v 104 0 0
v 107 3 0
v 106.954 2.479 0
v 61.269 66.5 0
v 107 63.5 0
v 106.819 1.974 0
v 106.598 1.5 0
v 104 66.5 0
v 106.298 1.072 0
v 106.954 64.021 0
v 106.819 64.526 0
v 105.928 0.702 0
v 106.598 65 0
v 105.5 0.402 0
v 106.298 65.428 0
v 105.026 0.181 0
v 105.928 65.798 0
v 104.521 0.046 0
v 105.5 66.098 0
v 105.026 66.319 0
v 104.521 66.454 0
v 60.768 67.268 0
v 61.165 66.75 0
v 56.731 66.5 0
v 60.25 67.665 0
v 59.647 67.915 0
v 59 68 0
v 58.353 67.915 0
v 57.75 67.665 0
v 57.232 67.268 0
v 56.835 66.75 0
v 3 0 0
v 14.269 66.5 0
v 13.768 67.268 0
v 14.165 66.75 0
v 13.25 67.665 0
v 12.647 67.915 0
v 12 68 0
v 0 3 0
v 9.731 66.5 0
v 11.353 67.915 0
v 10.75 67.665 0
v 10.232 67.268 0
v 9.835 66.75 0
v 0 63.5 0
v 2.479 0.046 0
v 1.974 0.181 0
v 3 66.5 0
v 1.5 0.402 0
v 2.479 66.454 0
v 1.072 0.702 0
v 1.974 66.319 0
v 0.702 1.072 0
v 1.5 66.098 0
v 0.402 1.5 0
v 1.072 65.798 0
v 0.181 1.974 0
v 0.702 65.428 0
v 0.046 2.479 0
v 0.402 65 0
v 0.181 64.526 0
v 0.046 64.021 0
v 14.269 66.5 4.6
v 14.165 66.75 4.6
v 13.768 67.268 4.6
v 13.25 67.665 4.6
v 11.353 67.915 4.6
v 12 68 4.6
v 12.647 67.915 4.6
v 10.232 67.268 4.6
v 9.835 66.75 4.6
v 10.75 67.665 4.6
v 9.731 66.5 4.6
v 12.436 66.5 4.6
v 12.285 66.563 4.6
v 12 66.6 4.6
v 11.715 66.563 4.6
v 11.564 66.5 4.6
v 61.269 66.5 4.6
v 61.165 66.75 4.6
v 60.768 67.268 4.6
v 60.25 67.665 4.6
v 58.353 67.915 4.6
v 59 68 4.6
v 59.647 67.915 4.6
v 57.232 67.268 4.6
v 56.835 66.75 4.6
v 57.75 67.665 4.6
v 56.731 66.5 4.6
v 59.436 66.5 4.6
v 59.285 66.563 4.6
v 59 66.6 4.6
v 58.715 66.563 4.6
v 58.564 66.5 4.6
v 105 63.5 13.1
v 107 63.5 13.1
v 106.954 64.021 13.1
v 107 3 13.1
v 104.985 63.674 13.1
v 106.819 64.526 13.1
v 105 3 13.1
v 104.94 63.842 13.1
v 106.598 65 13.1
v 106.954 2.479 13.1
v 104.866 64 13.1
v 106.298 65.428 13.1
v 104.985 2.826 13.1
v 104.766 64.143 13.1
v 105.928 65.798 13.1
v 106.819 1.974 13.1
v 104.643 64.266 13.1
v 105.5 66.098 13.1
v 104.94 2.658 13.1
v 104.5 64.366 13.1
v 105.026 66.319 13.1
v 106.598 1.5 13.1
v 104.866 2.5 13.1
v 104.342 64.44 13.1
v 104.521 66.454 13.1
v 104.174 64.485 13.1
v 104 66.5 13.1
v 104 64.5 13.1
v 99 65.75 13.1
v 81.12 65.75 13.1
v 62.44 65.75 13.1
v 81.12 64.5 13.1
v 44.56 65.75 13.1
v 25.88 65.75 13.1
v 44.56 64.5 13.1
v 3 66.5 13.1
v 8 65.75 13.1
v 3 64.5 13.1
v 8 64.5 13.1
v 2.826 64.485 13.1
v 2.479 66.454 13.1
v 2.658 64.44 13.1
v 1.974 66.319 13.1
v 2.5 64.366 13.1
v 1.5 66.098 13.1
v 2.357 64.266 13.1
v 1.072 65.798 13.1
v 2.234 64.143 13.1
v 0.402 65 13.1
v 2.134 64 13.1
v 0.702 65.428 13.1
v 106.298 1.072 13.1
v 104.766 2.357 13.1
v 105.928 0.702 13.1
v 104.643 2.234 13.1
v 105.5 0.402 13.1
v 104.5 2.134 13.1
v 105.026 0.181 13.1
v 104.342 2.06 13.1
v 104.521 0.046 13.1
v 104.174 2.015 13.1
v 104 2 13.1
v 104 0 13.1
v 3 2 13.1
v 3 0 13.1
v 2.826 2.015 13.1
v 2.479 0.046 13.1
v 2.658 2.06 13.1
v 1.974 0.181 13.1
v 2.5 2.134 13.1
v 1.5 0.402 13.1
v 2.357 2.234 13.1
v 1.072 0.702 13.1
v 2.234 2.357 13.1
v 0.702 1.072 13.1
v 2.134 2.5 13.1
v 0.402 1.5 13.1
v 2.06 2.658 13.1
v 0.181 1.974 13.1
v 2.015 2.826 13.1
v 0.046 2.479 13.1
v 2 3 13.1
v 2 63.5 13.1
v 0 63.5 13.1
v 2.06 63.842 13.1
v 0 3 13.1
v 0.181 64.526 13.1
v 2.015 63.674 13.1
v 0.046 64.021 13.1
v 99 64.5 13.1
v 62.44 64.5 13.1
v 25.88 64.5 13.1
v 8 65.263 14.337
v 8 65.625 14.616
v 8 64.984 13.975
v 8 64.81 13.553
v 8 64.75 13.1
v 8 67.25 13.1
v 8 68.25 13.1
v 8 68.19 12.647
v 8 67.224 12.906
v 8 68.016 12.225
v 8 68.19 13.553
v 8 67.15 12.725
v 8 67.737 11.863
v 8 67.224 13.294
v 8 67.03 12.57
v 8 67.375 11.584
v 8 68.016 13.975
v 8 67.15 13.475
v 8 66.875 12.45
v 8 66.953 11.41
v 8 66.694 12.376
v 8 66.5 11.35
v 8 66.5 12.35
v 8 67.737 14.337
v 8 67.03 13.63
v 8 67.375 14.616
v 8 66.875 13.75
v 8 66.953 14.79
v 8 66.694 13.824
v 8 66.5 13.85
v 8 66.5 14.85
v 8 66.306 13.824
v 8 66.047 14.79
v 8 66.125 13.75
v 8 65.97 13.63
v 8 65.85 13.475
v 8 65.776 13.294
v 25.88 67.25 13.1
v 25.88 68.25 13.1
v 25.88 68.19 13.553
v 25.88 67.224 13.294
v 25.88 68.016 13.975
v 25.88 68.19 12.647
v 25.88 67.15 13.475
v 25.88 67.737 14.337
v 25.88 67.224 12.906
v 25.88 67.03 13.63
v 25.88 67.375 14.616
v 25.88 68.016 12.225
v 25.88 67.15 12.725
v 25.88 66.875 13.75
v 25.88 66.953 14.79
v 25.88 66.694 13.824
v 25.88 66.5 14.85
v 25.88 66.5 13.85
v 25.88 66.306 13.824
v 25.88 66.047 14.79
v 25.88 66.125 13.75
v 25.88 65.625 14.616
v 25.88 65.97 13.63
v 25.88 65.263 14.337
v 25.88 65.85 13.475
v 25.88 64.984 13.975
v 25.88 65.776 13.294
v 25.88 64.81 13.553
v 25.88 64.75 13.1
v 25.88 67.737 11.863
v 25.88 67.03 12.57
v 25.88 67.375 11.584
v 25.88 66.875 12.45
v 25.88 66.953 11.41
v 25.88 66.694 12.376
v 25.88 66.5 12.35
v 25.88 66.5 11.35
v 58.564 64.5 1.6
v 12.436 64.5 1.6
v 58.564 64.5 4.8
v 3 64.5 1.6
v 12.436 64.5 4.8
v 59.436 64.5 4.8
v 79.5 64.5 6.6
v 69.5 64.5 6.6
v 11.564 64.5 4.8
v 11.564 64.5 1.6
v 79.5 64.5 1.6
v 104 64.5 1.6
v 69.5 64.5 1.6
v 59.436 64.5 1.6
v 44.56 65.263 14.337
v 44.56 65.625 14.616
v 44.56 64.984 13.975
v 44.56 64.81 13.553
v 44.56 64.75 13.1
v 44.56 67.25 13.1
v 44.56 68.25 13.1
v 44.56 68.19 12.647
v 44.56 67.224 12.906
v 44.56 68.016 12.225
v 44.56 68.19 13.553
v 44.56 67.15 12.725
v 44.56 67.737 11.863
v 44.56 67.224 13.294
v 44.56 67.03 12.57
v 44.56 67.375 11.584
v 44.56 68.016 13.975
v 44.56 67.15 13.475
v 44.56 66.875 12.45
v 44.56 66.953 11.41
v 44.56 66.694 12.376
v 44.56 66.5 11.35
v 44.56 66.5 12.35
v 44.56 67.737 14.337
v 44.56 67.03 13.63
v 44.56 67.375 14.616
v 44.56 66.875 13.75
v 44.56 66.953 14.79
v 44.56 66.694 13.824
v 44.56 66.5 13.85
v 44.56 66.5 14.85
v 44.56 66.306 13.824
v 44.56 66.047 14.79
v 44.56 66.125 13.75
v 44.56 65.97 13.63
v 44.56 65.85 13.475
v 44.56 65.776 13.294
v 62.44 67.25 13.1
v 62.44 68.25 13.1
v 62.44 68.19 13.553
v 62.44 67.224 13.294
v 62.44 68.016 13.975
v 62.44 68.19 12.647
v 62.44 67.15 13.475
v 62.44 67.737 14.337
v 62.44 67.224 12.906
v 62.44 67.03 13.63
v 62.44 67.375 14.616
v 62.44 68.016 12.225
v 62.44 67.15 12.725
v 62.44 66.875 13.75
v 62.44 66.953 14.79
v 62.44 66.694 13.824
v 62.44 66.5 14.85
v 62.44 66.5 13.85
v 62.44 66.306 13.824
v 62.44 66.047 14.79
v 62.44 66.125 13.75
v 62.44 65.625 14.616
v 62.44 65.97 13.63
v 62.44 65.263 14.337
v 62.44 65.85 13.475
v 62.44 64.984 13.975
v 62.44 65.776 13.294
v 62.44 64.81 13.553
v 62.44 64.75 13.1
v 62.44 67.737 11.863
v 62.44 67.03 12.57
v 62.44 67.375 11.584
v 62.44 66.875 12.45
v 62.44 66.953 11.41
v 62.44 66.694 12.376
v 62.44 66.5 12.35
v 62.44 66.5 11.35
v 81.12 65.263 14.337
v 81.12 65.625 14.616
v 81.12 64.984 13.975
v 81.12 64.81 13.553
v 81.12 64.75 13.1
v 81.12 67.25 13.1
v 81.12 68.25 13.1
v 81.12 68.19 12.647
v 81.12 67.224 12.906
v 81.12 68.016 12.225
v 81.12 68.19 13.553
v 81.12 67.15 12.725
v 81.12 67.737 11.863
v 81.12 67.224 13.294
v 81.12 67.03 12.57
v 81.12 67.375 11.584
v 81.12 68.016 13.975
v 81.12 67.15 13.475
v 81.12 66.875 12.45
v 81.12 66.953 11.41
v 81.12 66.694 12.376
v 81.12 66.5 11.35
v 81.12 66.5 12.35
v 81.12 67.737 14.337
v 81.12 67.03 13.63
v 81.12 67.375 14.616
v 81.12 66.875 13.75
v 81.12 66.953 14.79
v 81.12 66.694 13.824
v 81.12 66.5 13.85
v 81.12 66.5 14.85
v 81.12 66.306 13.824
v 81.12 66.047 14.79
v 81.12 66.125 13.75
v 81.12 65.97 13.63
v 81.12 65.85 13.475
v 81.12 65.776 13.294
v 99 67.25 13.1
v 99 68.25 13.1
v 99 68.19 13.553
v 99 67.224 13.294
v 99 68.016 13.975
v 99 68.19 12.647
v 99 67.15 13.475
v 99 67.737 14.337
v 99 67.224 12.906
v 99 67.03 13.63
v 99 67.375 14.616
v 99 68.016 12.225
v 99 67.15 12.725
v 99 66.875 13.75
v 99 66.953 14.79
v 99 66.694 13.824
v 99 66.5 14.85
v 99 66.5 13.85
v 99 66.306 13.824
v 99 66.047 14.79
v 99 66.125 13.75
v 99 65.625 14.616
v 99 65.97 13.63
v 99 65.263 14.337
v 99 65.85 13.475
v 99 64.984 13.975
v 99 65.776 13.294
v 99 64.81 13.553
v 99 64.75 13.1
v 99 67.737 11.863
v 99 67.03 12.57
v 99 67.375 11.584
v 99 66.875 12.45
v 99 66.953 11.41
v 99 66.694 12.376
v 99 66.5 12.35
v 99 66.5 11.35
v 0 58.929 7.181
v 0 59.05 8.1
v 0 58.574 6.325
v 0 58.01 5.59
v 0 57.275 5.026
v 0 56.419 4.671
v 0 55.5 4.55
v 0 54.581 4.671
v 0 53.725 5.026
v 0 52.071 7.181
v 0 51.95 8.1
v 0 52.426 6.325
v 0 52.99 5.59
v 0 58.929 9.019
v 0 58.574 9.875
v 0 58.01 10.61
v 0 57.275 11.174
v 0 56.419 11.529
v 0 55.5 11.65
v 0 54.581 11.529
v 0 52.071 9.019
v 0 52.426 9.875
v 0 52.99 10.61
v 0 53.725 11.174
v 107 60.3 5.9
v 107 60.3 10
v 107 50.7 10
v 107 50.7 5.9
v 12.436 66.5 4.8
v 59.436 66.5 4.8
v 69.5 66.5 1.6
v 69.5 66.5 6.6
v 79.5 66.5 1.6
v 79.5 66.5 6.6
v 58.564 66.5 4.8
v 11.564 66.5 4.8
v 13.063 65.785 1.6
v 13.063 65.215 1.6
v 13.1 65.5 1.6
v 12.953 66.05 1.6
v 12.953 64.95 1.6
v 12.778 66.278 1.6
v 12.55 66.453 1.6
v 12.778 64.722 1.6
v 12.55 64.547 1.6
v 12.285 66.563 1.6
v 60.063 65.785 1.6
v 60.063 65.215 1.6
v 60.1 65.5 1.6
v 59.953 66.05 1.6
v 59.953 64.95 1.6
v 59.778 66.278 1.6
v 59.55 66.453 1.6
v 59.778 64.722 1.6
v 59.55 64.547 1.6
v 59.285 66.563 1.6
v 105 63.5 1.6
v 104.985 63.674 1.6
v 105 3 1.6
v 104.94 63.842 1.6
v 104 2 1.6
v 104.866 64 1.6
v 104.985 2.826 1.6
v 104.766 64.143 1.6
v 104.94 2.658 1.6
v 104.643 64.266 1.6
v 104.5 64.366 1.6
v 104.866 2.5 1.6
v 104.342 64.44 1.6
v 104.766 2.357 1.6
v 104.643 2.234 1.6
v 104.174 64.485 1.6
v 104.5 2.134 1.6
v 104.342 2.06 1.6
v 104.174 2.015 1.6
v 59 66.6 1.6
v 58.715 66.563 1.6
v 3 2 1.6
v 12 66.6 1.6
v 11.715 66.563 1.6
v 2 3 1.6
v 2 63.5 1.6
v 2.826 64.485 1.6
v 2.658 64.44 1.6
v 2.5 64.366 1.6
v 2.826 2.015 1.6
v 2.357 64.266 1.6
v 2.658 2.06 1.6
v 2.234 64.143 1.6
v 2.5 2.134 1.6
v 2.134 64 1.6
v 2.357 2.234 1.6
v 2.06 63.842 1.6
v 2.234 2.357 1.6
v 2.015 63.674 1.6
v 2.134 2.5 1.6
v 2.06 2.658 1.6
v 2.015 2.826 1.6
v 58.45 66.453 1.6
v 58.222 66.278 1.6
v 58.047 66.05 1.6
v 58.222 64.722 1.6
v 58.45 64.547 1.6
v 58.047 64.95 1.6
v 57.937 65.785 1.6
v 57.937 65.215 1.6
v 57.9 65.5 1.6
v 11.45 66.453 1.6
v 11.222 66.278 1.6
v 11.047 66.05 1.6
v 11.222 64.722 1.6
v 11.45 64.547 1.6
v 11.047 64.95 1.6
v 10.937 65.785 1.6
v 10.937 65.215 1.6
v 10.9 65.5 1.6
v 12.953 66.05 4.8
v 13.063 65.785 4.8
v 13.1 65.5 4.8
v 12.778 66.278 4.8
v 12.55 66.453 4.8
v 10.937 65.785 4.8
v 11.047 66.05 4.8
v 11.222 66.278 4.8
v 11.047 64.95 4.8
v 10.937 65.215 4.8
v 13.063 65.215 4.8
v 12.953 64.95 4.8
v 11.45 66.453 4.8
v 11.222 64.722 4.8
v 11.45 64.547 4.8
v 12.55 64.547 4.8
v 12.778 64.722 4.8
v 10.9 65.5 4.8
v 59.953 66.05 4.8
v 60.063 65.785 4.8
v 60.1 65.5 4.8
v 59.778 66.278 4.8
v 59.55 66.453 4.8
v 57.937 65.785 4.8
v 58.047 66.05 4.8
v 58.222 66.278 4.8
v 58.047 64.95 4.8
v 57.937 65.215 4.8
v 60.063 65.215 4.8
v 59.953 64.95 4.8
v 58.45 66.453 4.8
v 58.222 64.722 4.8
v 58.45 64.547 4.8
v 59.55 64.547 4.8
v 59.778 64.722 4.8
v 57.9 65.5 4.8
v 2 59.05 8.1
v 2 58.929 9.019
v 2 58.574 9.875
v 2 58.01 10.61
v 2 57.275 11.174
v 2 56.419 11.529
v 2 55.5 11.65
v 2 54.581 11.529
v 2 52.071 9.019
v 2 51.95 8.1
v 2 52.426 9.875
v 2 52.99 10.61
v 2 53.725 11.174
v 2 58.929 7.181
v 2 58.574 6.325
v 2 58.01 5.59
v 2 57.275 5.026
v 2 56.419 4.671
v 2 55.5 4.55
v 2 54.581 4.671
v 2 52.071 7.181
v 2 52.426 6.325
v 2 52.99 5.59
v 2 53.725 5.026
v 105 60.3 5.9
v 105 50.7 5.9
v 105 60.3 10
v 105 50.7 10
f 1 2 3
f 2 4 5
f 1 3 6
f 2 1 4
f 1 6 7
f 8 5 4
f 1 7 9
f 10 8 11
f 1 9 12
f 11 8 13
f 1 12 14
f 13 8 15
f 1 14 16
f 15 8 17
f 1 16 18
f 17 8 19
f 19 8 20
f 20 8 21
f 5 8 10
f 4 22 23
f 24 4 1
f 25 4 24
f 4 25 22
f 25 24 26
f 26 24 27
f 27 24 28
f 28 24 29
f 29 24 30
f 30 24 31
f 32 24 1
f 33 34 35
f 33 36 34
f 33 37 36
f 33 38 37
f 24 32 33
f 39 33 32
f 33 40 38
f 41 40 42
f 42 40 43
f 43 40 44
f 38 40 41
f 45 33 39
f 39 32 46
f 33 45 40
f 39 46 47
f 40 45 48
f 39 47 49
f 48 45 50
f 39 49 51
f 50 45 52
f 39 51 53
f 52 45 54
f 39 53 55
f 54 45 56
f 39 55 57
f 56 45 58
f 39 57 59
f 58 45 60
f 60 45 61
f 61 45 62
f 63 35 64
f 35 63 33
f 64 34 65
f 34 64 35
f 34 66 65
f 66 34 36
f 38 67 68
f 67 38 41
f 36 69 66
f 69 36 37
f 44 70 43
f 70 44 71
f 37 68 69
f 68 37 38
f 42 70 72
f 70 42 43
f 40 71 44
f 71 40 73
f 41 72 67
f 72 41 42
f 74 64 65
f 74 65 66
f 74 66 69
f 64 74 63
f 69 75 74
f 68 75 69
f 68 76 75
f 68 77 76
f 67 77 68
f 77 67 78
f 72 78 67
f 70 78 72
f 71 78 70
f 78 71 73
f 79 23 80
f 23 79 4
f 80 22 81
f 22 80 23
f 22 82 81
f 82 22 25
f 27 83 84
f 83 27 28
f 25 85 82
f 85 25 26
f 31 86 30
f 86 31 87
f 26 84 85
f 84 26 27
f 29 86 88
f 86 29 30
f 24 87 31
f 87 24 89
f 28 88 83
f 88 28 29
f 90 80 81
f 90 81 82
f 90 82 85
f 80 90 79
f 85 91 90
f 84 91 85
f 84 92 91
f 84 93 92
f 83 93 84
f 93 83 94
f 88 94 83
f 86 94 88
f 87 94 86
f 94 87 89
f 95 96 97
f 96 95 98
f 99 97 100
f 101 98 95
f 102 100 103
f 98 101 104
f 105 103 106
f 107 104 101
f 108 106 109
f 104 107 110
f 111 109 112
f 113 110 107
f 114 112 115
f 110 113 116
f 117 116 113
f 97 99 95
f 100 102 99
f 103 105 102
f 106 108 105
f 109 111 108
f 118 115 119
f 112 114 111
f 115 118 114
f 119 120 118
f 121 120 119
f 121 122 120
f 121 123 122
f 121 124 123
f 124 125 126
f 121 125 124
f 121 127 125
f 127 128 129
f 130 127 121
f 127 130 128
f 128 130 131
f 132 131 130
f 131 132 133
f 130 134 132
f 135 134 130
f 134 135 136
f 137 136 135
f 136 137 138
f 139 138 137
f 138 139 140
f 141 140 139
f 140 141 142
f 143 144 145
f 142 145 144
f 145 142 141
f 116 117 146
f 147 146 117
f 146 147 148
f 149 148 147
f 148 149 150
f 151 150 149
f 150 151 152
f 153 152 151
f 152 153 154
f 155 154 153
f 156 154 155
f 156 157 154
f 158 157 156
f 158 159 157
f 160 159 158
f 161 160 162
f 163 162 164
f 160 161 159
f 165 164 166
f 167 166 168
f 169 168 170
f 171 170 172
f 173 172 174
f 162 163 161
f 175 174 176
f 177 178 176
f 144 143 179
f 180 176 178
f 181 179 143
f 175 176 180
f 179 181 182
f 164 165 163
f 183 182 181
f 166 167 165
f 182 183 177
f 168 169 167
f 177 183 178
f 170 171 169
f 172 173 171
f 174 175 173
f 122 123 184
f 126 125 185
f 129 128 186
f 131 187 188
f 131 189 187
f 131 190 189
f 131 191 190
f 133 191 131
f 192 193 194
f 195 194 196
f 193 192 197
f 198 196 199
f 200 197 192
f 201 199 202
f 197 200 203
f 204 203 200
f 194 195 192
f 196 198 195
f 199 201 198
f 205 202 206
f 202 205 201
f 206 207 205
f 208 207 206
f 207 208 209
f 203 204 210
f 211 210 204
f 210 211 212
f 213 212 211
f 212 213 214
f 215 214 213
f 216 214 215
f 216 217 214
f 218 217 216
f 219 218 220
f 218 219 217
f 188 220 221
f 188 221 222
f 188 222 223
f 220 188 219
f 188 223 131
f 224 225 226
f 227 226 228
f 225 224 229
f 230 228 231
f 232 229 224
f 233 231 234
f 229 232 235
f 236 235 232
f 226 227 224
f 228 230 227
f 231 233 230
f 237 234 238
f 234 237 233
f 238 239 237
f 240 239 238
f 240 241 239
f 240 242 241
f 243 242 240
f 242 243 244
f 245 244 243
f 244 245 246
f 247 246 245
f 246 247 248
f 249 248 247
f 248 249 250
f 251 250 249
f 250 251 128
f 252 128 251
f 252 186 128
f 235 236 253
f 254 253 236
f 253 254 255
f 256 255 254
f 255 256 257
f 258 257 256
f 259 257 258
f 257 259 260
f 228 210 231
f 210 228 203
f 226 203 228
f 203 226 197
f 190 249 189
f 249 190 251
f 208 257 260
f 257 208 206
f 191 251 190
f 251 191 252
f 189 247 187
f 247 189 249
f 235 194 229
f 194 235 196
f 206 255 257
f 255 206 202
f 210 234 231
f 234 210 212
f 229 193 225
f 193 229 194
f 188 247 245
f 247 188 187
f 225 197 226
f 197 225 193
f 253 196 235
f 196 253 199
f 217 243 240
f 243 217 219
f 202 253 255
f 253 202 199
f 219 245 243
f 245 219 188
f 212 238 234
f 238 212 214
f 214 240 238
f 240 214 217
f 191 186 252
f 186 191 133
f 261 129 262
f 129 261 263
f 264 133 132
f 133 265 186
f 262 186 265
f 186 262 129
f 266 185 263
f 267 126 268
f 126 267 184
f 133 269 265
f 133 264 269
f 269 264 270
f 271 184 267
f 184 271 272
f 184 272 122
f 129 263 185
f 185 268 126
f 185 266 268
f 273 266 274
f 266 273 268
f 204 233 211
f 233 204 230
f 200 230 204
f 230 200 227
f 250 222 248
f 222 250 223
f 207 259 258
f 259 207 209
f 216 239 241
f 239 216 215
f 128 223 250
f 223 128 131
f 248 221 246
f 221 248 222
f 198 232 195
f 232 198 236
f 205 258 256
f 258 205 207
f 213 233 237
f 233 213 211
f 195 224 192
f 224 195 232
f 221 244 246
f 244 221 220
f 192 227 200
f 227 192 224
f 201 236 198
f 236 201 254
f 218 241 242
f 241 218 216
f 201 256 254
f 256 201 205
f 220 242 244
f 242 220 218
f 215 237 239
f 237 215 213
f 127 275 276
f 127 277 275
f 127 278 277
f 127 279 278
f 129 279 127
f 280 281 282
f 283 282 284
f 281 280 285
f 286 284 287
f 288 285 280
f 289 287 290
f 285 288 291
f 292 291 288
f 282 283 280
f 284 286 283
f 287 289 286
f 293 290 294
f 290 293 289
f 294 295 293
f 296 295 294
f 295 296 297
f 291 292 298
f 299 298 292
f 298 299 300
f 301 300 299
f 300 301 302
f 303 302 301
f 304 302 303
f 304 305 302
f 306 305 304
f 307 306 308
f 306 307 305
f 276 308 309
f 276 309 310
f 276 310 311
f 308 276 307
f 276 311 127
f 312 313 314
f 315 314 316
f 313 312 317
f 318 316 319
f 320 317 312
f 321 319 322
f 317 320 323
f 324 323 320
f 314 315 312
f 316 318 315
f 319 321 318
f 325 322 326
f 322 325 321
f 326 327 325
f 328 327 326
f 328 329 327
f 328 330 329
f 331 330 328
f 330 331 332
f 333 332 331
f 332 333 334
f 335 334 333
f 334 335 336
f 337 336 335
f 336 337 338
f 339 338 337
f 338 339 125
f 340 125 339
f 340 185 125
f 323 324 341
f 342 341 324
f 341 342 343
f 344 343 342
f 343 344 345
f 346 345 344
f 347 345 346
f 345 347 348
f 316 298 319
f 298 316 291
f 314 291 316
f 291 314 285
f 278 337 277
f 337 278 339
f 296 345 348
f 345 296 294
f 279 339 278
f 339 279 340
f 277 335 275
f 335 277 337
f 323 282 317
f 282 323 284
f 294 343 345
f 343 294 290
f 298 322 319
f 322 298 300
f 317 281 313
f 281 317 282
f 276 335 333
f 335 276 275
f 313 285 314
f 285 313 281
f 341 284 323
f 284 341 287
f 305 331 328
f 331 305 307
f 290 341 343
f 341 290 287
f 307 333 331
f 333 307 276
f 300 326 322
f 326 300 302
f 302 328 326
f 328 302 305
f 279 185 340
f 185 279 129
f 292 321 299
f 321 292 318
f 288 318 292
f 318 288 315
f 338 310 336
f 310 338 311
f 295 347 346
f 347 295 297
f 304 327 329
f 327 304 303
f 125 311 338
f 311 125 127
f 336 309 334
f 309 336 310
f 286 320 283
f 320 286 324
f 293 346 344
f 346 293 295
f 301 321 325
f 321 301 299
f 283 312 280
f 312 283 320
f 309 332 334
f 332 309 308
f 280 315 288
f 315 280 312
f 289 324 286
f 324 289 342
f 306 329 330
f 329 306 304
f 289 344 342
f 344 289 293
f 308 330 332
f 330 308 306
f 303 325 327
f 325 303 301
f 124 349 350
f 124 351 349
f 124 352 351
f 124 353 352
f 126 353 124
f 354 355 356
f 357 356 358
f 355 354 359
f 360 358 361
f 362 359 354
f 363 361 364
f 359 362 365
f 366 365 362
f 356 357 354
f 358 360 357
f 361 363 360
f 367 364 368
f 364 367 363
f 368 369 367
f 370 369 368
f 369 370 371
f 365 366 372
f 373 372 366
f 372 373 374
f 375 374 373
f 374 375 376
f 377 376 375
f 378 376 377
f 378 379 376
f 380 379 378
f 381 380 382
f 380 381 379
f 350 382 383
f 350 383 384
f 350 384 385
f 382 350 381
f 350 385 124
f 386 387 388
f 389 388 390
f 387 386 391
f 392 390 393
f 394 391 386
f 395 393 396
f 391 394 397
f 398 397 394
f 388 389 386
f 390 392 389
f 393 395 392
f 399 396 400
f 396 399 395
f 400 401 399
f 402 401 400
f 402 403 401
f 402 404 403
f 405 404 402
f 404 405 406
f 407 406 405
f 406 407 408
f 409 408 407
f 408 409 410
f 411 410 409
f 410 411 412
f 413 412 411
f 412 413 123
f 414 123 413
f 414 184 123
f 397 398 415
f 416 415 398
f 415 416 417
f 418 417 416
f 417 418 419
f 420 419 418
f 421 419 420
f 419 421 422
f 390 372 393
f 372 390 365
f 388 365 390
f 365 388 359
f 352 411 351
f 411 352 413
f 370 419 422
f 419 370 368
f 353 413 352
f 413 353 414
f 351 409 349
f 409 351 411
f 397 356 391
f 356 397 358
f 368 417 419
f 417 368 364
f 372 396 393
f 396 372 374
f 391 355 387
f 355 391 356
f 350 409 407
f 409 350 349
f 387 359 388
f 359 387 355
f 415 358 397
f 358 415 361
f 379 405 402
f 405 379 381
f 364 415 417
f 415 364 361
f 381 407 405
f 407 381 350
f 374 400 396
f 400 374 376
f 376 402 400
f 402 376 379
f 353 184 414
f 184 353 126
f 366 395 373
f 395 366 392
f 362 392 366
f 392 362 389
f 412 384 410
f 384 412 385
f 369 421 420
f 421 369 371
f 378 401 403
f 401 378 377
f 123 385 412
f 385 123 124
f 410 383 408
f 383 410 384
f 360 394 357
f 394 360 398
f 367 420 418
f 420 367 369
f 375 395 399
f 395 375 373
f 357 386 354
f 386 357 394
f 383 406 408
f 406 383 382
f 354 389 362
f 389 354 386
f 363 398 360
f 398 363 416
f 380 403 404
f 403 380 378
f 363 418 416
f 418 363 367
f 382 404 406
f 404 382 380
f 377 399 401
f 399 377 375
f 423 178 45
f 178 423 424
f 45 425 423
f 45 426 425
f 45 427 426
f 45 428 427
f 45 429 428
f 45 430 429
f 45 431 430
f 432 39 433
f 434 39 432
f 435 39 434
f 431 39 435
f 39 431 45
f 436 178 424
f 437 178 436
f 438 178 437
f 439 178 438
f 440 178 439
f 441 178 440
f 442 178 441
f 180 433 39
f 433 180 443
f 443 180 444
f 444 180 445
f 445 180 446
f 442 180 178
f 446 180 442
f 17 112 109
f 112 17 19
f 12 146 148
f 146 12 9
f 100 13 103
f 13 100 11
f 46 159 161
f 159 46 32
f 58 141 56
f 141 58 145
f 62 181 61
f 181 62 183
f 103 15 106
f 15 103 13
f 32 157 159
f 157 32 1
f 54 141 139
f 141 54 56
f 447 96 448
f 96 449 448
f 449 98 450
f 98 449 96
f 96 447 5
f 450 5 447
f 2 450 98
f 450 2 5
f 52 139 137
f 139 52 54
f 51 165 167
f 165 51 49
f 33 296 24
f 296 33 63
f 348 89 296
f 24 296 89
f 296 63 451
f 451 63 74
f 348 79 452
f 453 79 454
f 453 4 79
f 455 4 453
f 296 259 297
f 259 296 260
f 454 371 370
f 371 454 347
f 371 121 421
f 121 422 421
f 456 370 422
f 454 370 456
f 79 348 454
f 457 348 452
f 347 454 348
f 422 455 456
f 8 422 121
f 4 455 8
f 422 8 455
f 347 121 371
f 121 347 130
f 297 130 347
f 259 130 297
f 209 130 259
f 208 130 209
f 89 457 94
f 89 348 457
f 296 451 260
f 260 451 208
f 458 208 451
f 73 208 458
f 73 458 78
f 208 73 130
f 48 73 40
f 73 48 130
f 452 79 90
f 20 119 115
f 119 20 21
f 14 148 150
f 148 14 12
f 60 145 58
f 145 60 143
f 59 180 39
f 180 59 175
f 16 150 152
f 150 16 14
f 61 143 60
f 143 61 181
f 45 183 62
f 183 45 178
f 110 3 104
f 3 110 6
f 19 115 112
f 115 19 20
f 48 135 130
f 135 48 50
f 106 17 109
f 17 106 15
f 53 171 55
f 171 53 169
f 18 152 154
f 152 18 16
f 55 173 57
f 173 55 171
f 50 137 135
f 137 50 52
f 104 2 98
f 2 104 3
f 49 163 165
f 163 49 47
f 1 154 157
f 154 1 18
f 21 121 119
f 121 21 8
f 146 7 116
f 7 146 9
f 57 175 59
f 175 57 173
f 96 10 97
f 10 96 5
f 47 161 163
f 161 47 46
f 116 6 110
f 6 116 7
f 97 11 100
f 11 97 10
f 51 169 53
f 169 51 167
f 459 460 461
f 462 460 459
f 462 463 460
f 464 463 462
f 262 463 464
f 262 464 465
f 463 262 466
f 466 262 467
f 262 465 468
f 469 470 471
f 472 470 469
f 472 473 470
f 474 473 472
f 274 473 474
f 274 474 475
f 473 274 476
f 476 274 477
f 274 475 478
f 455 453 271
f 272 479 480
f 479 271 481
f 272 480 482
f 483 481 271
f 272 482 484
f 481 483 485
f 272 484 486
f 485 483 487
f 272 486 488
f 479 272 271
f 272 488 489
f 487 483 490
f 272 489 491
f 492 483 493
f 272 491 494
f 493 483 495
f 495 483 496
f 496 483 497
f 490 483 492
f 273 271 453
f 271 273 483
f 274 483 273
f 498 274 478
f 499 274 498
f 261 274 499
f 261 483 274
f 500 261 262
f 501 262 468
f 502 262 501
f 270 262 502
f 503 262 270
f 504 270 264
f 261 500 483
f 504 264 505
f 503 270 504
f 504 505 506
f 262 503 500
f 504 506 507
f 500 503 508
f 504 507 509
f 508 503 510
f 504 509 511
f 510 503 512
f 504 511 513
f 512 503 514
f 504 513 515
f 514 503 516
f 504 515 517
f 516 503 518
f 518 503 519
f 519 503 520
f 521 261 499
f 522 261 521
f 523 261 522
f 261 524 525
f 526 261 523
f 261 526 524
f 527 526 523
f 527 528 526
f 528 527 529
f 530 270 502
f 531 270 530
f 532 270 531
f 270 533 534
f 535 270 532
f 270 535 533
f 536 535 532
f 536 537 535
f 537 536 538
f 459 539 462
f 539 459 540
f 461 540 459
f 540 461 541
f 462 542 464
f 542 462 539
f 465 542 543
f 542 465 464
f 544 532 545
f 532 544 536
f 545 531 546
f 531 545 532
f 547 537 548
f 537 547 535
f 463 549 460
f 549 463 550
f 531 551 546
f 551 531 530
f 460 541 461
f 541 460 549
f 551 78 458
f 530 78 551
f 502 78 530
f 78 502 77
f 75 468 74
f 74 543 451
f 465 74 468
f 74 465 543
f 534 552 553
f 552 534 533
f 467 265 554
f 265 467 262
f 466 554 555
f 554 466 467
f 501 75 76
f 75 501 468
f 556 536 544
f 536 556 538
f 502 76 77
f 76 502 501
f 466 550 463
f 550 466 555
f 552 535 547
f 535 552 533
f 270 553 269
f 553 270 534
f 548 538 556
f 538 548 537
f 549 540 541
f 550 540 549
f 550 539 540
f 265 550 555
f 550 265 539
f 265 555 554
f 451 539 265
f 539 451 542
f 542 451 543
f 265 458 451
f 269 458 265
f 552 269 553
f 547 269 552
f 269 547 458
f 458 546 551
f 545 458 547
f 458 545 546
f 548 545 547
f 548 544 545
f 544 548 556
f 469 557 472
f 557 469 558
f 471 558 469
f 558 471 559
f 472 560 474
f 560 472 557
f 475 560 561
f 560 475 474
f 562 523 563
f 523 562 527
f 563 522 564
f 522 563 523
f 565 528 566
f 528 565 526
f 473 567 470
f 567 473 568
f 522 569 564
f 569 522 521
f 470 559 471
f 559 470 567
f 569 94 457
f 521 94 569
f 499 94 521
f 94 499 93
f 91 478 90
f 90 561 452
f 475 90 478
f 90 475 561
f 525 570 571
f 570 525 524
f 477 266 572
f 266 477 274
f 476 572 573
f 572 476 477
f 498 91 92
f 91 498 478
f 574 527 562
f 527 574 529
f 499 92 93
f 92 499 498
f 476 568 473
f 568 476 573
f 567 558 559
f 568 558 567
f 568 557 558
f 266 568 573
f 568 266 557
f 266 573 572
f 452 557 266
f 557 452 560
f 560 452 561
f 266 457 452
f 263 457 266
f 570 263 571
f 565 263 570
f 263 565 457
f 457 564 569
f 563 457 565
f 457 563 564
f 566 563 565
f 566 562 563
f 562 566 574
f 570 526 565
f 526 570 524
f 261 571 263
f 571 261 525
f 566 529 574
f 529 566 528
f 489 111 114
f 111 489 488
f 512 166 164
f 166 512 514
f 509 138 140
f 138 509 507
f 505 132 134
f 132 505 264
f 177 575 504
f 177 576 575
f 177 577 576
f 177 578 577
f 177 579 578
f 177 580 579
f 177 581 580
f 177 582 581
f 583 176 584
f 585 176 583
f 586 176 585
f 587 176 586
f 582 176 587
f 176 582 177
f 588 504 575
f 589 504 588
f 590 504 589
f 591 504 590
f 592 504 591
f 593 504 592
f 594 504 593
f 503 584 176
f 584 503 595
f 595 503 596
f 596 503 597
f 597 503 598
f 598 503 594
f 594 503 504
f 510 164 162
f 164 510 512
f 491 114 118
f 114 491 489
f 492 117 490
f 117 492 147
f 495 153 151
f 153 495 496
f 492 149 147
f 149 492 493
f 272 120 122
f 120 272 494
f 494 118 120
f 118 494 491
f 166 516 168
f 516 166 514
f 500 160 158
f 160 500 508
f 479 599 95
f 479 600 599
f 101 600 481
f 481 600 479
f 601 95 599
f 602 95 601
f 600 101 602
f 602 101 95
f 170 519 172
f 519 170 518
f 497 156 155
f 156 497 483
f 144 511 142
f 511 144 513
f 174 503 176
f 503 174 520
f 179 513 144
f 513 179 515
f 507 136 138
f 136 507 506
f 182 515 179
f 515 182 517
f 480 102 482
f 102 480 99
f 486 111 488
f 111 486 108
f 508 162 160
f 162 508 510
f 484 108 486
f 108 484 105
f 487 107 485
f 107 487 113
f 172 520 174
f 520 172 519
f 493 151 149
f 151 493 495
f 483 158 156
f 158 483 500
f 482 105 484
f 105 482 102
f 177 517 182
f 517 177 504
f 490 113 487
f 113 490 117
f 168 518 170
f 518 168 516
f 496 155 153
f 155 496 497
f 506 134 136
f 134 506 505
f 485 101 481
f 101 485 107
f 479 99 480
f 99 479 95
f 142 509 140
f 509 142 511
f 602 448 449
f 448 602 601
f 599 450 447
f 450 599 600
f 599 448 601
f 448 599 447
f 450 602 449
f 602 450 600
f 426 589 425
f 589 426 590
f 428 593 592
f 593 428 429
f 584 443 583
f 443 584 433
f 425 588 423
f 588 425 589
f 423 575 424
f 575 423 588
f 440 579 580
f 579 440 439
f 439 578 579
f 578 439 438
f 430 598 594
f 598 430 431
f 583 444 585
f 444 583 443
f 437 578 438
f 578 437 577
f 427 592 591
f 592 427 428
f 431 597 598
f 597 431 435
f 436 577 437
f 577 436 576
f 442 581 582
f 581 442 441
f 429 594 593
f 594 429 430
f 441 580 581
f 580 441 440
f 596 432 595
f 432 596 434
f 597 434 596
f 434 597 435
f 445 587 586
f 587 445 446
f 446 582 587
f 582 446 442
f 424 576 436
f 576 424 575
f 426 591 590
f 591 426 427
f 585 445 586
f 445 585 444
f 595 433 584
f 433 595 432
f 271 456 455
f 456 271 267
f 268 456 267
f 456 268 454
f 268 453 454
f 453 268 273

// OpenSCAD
// =============================================================================
// Altoids Mesh Enclosure — Bottom Case
// =============================================================================
// Shallow tray (like the bottom of a real Altoids tin) that holds the
// battery, Heltec board (V3 or V4), and internal antenna.  The lid skirt
// slides over the top of these walls.
//
// Features:  battery compartment · Heltec mounting standoffs · hinge
//            knuckles · internal antenna channel · corner screw bosses
//            USB-C port cutout · SMA antenna passthrough · wire routing
// =============================================================================

include <parameters.scad>

// =========================================================================
//  Helper Modules
// =========================================================================

// Rounded rectangle (origin at corner, Z-up)
module rrect(size, r) {
    hull() {
        for (dx = [r, size[0] - r], dy = [r, size[1] - r])
            translate([dx, dy, 0])
                cylinder(r = r, h = size[2], $fn = 36);
    }
}

// Array of ventilation slots centred at origin
module vent_slots(n, len, w, spacing) {
    tw = n * w + (n - 1) * spacing;
    for (i = [0 : n - 1])
        translate([0, i * (w + spacing) - tw / 2, 0])
            cube([len, w, wall * 3], center = true);
}

// ----- Battery Retainer Clip -------------------------------------------------
module battery_retainer() {
    clip_h  = batt_ht * 0.6;
    clip_t  = 1.5;
    clip_oh = 2.0;
    cube([clip_t, batt_wid + fit_clearance * 2, clip_h]);
    translate([0, 0, clip_h])
        cube([clip_oh, batt_wid + fit_clearance * 2, clip_t]);
}

// ----- Hinge Knuckle (case side) ---------------------------------------------
// Barrel with paper-clip pin hole + support arm toward case interior.
module case_hinge_knuckle(x_pos, klen) {
    barrel_r = hinge_barrel_d / 2;
    translate([x_pos, case_ext_wid, case_ext_depth]) {
        difference() {
            union() {
                // Barrel along X
                rotate([0, 90, 0])
                    cylinder(d = hinge_barrel_d, h = klen, $fn = 24);
                // Arm connecting barrel to case wall (extends -Y, -Z)
                translate([0, -hinge_arm_t, -barrel_r])
                    cube([klen, hinge_arm_t, barrel_r]);
            }
            // Pin hole (paper-clip clearance)
            translate([-0.1, 0, 0])
                rotate([0, 90, 0])
                    cylinder(d = hinge_pin_d + tolerance * 2,
                             h = klen + 0.2, $fn = 24);
        }
    }
}

// =========================================================================
//  Main Bottom Case
// =========================================================================
module bottom_case() {
    difference() {
        union() {
            // ----------------------------------------------------------
            //  Outer shell
            // ----------------------------------------------------------
            rrect([case_ext_len, case_ext_wid, case_ext_depth], corner_r);

            // ----------------------------------------------------------
            //  Battery compartment rails
            // ----------------------------------------------------------
            translate([wall + batt_pos_x - 1.5,
                       wall + batt_pos_y - 1.5, 0]) {
                // Left rail
                cube([batt_len + batt_wire_clr + 3, 1.5,
                      floor_t + batt_ht * 0.7]);
                // Right rail
                translate([0, batt_wid + fit_clearance * 2 + 1.5, 0])
                    cube([batt_len + batt_wire_clr + 3, 1.5,
                          floor_t + batt_ht * 0.7]);
                // Back wall
                translate([-0.5, 0, 0])
                    cube([2.0, batt_wid + fit_clearance * 2 + 3,
                          floor_t + batt_ht * 0.7]);
            }

            // Battery retainer clip (front)
            translate([wall + batt_pos_x + batt_len + batt_wire_clr + 1,
                       wall + batt_pos_y - 1.5, 0]) {
                ch = batt_ht * 0.6;
                ct = 1.5;
                co = 2.0;
                cube([ct, batt_wid + fit_clearance * 2,
                      floor_t + ch]);
                translate([0, 0, floor_t + ch])
                    cube([co, batt_wid + fit_clearance * 2, ct]);
            }

            // ----------------------------------------------------------
            //  Heltec V4 mounting standoffs
            // ----------------------------------------------------------
            mount_pts = [
                [2.5, 2.5],
                [heltec_len - 2.5, 2.5],
                [2.5, heltec_wid - 2.5],
                [heltec_len - 2.5, heltec_wid - 2.5]
            ];
            for (p = mount_pts)
                translate([wall + heltec_pos_x + p[0],
                           wall + heltec_pos_y + p[1], 0])
                    cylinder(d = screw_boss_d - 1,
                             h = floor_t + heltec_standoff, $fn = 24);

            // ----------------------------------------------------------
            //  Corner screw bosses
            // ----------------------------------------------------------
            screw_pts = [
                [wall + 4, wall + 4],
                [case_ext_len - wall - 4, wall + 4],
                [wall + 4, case_ext_wid - wall - 4],
                [case_ext_len - wall - 4, case_ext_wid - wall - 4]
            ];
            for (p = screw_pts)
                translate([p[0], p[1], 0])
                    cylinder(d = screw_boss_d,
                             h = case_ext_depth, $fn = 24);

            // ----------------------------------------------------------
            //  Cable channel (between battery and Heltec)
            // ----------------------------------------------------------
            translate([wall + batt_pos_x + batt_len,
                       wall + batt_pos_y + batt_wid - 2, 0])
                cube([3,
                      heltec_pos_y - batt_pos_y - batt_wid + 4,
                      floor_t + 2]);

            // ----------------------------------------------------------
            //  Hinge knuckles  (case gets knuckles 0, 2, 4)
            // ----------------------------------------------------------
            for (i = [0, 2, 4]) {
                xp = hinge_margin + i * (hinge_knuckle_l + hinge_gap);
                case_hinge_knuckle(xp, hinge_knuckle_l);
            }

            // ----------------------------------------------------------
            //  Internal antenna housing channel
            // ----------------------------------------------------------
            translate([wall + ant_pos_x, wall, 0]) {
                // Retaining rail
                translate([0, ant_chan_w, 0])
                    cube([ant_len, ant_rail_t,
                          floor_t + ant_chan_d]);
                // End walls
                cube([ant_rail_t,
                      ant_chan_w + ant_rail_t,
                      floor_t + ant_chan_d]);
                translate([ant_len - ant_rail_t, 0, 0])
                    cube([ant_rail_t,
                          ant_chan_w + ant_rail_t,
                          floor_t + ant_chan_d]);
                // Retention clips
                for (i = [0 : ant_clip_n - 1]) {
                    cx = ant_len * (i + 1) / (ant_clip_n + 1)
                         - ant_clip_w / 2;
                    translate([cx, ant_rail_t + ant_clip_ins,
                               floor_t + ant_chan_d])
                        cube([ant_clip_w, ant_chan_w, ant_rail_t]);
                }
            }
        }

        // ==============================================================
        //  Subtractive features
        // ==============================================================

        // Hollow interior
        translate([wall, wall, floor_t])
            rrect([int_len, int_wid, case_int_depth + 1],
                  corner_r - wall);

        // USB-C port cutout (through +X end wall)
        translate([case_ext_len - wall - 0.1,
                   wall + heltec_pos_y + heltec_usbc_off_y
                       - usbc_cut_w / 2,
                   heltec_pos_z + heltec_pcb_t - tolerance])
            cube([wall + 0.2, usbc_cut_w, usbc_cut_h]);

        // SMA antenna passthrough (through −X end wall)
        translate([-0.1,
                   wall + heltec_pos_y + heltec_wid / 2,
                   heltec_pos_z + heltec_ht / 2])
            rotate([0, 90, 0])
                cylinder(d = antenna_cut_d, h = wall + 0.2, $fn = 24);

        // Wire routing slot (through back wall, between battery and
        // Heltec areas — allows external cable entry)
        translate([wall + batt_pos_x + batt_len,
                   case_ext_wid - wall - 0.1,
                   floor_t])
            cube([10, wall + 0.2, 5]);

        // Heltec mounting screw holes (blind — do not penetrate floor).
        // Holes run from the inner floor surface up through each
        // standoff (height = heltec_standoff) with 0.2 mm overcut.
        for (p = [ [2.5, 2.5],
                   [heltec_len - 2.5, 2.5],
                   [2.5, heltec_wid - 2.5],
                   [heltec_len - 2.5, heltec_wid - 2.5] ])
            translate([wall + heltec_pos_x + p[0],
                       wall + heltec_pos_y + p[1], floor_t])
                cylinder(d = heltec_mount_hole,
                         h = heltec_standoff + 0.2, $fn = 24);

        // NOTE: corner screw holes removed for sealed design.
        // Solid screw bosses remain for structural reinforcement.
    }
}

// Render when opened directly
bottom_case();
